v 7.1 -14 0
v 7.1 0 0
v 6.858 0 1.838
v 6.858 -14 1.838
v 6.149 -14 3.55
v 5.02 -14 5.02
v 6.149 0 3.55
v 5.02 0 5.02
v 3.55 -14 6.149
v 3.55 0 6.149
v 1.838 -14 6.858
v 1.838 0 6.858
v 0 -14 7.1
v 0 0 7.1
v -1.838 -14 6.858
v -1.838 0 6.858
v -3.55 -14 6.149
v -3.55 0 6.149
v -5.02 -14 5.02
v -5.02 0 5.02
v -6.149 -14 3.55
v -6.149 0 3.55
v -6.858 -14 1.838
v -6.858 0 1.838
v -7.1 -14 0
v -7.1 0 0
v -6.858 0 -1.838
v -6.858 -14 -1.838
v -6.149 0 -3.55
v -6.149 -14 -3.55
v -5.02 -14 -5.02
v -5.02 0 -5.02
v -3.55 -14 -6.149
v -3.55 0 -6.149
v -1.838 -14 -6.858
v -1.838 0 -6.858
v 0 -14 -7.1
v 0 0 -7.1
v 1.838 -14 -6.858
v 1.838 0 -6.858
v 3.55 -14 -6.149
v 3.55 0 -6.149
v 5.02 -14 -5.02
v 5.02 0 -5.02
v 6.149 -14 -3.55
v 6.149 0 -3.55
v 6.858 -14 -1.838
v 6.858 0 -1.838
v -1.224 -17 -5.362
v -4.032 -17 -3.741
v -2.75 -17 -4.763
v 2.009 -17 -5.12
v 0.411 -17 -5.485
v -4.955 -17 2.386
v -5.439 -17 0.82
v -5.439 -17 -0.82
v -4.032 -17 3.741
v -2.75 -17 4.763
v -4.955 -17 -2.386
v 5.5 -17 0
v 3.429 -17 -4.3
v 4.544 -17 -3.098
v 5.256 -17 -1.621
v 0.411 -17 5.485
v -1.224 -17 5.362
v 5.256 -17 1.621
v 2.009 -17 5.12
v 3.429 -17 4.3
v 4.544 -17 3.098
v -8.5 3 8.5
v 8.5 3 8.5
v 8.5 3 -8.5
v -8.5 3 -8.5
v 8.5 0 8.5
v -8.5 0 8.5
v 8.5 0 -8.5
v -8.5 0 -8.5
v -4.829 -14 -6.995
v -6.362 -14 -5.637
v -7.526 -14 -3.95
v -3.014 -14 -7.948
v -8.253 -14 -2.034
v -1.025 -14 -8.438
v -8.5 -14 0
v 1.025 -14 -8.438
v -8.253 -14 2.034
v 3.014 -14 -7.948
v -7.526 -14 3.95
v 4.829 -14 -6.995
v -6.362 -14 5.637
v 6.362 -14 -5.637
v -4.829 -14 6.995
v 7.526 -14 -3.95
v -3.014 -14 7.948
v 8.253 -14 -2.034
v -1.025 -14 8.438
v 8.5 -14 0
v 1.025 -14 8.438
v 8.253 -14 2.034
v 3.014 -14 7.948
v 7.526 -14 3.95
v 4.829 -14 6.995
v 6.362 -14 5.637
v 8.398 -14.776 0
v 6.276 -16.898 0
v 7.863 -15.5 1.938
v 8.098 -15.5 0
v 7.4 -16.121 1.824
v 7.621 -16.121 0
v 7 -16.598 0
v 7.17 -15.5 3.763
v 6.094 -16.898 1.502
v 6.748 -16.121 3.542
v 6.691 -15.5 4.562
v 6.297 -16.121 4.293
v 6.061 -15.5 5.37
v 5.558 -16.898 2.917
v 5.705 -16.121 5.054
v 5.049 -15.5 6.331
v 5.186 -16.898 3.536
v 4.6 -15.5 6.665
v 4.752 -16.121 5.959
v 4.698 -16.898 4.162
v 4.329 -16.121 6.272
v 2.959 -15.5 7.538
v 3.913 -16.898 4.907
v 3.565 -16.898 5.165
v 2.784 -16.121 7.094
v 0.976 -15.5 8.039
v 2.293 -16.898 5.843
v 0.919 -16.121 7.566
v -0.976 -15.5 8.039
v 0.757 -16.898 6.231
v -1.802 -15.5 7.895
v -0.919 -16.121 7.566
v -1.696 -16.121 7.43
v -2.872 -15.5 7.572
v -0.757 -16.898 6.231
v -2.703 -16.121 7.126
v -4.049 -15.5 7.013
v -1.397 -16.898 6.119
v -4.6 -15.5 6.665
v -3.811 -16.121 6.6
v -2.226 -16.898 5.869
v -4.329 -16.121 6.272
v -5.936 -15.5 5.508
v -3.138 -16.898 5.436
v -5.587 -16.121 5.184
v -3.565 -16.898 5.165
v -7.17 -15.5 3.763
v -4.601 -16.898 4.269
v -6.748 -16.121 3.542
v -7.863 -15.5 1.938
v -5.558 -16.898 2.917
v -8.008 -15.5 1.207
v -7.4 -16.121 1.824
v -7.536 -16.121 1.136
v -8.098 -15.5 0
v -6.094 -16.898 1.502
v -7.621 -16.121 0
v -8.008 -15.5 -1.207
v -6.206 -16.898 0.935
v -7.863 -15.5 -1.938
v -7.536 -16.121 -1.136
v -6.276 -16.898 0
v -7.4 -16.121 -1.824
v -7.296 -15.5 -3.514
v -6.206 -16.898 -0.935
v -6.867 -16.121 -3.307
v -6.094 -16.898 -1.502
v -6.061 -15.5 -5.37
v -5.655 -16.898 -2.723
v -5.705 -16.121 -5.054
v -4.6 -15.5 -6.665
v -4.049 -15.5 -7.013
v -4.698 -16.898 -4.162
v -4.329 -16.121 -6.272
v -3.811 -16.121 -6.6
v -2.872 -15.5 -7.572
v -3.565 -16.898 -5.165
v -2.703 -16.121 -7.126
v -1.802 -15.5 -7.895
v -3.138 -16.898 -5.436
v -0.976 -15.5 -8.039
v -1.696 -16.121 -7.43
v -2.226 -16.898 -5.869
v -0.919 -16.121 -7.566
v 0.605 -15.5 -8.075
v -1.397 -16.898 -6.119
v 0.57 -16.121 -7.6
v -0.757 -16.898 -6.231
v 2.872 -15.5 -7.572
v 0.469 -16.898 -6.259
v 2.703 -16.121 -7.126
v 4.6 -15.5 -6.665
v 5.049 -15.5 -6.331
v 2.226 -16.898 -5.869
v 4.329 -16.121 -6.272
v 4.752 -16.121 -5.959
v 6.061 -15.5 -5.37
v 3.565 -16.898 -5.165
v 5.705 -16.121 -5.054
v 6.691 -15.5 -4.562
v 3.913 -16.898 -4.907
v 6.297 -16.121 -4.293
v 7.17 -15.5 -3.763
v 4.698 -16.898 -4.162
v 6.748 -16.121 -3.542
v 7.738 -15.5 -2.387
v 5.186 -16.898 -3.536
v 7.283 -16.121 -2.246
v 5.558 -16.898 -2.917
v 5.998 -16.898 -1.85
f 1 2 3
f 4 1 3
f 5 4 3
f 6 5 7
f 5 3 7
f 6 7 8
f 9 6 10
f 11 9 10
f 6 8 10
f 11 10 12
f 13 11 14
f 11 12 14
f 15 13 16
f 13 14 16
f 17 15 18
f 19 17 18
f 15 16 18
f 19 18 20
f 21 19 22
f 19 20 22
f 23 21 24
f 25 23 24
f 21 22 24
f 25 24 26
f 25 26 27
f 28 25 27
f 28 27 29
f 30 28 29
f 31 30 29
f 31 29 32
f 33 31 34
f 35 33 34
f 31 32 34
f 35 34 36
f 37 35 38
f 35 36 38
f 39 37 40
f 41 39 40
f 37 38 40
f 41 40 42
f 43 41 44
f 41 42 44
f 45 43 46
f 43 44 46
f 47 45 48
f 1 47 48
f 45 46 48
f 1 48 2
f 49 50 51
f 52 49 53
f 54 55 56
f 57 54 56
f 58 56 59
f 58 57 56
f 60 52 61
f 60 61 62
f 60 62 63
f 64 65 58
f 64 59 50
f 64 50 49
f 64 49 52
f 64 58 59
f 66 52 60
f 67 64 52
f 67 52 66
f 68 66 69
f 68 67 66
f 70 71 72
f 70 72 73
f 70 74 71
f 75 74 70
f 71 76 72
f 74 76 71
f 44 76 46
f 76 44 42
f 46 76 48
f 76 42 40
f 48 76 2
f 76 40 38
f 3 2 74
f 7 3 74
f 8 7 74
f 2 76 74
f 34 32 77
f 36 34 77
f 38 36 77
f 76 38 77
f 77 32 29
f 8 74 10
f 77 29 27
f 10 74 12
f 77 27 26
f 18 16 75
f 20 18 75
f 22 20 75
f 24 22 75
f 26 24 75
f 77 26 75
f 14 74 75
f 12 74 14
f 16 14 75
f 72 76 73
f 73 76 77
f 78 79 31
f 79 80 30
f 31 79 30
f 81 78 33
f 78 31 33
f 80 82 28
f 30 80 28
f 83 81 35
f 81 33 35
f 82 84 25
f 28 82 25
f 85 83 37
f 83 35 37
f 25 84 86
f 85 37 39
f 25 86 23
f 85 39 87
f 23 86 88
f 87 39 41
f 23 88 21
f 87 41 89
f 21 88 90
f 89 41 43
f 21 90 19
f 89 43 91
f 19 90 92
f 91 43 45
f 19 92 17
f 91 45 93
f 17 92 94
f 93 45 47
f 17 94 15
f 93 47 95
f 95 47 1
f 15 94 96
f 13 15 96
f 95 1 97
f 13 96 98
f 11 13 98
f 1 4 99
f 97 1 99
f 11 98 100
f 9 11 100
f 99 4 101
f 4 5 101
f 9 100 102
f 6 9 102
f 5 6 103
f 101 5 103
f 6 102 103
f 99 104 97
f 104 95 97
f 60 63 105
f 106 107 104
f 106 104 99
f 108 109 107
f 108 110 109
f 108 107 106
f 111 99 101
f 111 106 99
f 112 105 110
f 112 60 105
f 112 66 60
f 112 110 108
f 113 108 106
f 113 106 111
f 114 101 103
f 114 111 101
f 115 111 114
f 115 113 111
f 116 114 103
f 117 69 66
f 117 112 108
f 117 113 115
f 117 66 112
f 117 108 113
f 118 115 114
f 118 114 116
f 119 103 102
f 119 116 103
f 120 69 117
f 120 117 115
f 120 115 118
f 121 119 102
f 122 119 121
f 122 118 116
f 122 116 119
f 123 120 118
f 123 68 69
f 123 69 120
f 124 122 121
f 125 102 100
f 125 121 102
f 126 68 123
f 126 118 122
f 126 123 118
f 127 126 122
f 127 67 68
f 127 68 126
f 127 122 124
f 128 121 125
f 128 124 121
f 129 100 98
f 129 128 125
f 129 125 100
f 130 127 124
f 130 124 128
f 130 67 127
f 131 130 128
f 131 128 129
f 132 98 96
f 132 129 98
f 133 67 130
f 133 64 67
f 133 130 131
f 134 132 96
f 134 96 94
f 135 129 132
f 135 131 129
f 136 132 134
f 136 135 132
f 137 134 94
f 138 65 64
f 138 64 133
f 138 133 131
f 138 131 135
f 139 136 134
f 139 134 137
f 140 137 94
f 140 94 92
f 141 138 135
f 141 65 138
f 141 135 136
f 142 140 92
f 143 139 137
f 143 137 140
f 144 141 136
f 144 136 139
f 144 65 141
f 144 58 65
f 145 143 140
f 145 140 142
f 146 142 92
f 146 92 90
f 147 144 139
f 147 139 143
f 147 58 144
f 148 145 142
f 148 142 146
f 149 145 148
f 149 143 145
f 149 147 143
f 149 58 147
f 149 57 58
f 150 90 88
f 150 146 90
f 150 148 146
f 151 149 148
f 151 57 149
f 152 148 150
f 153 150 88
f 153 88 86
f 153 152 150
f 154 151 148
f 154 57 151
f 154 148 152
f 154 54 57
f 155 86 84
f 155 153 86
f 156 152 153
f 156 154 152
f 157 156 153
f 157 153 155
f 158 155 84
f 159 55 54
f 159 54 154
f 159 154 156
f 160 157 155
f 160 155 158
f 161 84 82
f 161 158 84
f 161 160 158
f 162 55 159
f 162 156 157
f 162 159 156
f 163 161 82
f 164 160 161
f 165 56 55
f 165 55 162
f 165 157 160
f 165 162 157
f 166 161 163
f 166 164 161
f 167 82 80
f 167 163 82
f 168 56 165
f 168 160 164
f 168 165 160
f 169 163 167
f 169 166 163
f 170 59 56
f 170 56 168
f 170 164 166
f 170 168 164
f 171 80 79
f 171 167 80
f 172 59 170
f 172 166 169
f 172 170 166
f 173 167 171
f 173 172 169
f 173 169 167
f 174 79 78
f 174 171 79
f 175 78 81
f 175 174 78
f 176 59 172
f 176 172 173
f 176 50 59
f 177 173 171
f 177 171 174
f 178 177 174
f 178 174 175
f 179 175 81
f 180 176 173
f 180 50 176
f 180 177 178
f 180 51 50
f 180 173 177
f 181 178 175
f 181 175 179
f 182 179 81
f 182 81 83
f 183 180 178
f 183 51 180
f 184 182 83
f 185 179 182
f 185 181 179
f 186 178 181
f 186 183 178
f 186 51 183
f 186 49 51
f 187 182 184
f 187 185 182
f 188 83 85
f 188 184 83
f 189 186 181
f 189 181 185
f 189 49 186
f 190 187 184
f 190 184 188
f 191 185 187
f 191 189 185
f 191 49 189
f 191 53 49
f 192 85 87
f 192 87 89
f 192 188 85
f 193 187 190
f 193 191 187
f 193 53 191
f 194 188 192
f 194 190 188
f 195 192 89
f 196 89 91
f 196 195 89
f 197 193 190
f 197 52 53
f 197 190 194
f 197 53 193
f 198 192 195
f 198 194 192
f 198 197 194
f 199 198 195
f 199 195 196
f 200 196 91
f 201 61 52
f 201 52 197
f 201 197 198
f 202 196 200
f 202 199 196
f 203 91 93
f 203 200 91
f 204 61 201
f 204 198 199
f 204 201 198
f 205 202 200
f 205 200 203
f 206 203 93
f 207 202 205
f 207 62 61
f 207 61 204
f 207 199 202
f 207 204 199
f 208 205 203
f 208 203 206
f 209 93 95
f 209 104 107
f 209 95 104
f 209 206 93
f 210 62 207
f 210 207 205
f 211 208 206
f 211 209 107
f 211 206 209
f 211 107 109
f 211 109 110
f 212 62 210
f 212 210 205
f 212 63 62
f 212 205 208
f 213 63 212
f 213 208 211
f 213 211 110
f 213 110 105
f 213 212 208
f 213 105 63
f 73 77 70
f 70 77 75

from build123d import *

# Parameters (mm, degrees)
F0_R     = 7.1
F1_DEPTH = 14
F2_R     = 8.5
F2_R_2   = 7.1
F3_DEPTH = 3
F4_R     = 2.99999
F5_W     = 17
F5_H     = 17
F5_R     = 7.1
F6_DEPTH = 3


# Not quite as in the source:
# - a fillet or chamfer is up to 0.001 mm smaller than in the source, because OpenCascade refuses the exact size


with BuildPart() as f1:
    # F0 (on Front) → F1 (new body)
    with BuildSketch(Plane.XZ):
        Circle(F0_R)
    extrude(amount=F1_DEPTH)

    # F2 (on face) → F3 (join)
    with BuildSketch(Plane.XZ.offset(14)):
        Circle(F2_R)
        Circle(F2_R_2, mode=Mode.SUBTRACT)
        Circle(F2_R_2)
    extrude(amount=F3_DEPTH)

    # F4 (radius 3 in the source; OpenCascade refuses exactly that, so slightly less here)
    f4_edges = [f1.edges().sort_by_distance(p)[0] for p in [
        (-8.5, -17, 0),
    ]]
    fillet(f4_edges, radius=F4_R)

    # F5 (on face) → F6 (join)
    with BuildSketch(Plane(origin=(0, 0, 0), x_dir=(-1, 0, 0), z_dir=(0, 1, 0))):
        with Locations((2.794e-06, 0)):
            Rectangle(F5_W, F5_H)
        Circle(F5_R, mode=Mode.SUBTRACT)
        Circle(F5_R)
    extrude(amount=F6_DEPTH)


solid = f1.part
